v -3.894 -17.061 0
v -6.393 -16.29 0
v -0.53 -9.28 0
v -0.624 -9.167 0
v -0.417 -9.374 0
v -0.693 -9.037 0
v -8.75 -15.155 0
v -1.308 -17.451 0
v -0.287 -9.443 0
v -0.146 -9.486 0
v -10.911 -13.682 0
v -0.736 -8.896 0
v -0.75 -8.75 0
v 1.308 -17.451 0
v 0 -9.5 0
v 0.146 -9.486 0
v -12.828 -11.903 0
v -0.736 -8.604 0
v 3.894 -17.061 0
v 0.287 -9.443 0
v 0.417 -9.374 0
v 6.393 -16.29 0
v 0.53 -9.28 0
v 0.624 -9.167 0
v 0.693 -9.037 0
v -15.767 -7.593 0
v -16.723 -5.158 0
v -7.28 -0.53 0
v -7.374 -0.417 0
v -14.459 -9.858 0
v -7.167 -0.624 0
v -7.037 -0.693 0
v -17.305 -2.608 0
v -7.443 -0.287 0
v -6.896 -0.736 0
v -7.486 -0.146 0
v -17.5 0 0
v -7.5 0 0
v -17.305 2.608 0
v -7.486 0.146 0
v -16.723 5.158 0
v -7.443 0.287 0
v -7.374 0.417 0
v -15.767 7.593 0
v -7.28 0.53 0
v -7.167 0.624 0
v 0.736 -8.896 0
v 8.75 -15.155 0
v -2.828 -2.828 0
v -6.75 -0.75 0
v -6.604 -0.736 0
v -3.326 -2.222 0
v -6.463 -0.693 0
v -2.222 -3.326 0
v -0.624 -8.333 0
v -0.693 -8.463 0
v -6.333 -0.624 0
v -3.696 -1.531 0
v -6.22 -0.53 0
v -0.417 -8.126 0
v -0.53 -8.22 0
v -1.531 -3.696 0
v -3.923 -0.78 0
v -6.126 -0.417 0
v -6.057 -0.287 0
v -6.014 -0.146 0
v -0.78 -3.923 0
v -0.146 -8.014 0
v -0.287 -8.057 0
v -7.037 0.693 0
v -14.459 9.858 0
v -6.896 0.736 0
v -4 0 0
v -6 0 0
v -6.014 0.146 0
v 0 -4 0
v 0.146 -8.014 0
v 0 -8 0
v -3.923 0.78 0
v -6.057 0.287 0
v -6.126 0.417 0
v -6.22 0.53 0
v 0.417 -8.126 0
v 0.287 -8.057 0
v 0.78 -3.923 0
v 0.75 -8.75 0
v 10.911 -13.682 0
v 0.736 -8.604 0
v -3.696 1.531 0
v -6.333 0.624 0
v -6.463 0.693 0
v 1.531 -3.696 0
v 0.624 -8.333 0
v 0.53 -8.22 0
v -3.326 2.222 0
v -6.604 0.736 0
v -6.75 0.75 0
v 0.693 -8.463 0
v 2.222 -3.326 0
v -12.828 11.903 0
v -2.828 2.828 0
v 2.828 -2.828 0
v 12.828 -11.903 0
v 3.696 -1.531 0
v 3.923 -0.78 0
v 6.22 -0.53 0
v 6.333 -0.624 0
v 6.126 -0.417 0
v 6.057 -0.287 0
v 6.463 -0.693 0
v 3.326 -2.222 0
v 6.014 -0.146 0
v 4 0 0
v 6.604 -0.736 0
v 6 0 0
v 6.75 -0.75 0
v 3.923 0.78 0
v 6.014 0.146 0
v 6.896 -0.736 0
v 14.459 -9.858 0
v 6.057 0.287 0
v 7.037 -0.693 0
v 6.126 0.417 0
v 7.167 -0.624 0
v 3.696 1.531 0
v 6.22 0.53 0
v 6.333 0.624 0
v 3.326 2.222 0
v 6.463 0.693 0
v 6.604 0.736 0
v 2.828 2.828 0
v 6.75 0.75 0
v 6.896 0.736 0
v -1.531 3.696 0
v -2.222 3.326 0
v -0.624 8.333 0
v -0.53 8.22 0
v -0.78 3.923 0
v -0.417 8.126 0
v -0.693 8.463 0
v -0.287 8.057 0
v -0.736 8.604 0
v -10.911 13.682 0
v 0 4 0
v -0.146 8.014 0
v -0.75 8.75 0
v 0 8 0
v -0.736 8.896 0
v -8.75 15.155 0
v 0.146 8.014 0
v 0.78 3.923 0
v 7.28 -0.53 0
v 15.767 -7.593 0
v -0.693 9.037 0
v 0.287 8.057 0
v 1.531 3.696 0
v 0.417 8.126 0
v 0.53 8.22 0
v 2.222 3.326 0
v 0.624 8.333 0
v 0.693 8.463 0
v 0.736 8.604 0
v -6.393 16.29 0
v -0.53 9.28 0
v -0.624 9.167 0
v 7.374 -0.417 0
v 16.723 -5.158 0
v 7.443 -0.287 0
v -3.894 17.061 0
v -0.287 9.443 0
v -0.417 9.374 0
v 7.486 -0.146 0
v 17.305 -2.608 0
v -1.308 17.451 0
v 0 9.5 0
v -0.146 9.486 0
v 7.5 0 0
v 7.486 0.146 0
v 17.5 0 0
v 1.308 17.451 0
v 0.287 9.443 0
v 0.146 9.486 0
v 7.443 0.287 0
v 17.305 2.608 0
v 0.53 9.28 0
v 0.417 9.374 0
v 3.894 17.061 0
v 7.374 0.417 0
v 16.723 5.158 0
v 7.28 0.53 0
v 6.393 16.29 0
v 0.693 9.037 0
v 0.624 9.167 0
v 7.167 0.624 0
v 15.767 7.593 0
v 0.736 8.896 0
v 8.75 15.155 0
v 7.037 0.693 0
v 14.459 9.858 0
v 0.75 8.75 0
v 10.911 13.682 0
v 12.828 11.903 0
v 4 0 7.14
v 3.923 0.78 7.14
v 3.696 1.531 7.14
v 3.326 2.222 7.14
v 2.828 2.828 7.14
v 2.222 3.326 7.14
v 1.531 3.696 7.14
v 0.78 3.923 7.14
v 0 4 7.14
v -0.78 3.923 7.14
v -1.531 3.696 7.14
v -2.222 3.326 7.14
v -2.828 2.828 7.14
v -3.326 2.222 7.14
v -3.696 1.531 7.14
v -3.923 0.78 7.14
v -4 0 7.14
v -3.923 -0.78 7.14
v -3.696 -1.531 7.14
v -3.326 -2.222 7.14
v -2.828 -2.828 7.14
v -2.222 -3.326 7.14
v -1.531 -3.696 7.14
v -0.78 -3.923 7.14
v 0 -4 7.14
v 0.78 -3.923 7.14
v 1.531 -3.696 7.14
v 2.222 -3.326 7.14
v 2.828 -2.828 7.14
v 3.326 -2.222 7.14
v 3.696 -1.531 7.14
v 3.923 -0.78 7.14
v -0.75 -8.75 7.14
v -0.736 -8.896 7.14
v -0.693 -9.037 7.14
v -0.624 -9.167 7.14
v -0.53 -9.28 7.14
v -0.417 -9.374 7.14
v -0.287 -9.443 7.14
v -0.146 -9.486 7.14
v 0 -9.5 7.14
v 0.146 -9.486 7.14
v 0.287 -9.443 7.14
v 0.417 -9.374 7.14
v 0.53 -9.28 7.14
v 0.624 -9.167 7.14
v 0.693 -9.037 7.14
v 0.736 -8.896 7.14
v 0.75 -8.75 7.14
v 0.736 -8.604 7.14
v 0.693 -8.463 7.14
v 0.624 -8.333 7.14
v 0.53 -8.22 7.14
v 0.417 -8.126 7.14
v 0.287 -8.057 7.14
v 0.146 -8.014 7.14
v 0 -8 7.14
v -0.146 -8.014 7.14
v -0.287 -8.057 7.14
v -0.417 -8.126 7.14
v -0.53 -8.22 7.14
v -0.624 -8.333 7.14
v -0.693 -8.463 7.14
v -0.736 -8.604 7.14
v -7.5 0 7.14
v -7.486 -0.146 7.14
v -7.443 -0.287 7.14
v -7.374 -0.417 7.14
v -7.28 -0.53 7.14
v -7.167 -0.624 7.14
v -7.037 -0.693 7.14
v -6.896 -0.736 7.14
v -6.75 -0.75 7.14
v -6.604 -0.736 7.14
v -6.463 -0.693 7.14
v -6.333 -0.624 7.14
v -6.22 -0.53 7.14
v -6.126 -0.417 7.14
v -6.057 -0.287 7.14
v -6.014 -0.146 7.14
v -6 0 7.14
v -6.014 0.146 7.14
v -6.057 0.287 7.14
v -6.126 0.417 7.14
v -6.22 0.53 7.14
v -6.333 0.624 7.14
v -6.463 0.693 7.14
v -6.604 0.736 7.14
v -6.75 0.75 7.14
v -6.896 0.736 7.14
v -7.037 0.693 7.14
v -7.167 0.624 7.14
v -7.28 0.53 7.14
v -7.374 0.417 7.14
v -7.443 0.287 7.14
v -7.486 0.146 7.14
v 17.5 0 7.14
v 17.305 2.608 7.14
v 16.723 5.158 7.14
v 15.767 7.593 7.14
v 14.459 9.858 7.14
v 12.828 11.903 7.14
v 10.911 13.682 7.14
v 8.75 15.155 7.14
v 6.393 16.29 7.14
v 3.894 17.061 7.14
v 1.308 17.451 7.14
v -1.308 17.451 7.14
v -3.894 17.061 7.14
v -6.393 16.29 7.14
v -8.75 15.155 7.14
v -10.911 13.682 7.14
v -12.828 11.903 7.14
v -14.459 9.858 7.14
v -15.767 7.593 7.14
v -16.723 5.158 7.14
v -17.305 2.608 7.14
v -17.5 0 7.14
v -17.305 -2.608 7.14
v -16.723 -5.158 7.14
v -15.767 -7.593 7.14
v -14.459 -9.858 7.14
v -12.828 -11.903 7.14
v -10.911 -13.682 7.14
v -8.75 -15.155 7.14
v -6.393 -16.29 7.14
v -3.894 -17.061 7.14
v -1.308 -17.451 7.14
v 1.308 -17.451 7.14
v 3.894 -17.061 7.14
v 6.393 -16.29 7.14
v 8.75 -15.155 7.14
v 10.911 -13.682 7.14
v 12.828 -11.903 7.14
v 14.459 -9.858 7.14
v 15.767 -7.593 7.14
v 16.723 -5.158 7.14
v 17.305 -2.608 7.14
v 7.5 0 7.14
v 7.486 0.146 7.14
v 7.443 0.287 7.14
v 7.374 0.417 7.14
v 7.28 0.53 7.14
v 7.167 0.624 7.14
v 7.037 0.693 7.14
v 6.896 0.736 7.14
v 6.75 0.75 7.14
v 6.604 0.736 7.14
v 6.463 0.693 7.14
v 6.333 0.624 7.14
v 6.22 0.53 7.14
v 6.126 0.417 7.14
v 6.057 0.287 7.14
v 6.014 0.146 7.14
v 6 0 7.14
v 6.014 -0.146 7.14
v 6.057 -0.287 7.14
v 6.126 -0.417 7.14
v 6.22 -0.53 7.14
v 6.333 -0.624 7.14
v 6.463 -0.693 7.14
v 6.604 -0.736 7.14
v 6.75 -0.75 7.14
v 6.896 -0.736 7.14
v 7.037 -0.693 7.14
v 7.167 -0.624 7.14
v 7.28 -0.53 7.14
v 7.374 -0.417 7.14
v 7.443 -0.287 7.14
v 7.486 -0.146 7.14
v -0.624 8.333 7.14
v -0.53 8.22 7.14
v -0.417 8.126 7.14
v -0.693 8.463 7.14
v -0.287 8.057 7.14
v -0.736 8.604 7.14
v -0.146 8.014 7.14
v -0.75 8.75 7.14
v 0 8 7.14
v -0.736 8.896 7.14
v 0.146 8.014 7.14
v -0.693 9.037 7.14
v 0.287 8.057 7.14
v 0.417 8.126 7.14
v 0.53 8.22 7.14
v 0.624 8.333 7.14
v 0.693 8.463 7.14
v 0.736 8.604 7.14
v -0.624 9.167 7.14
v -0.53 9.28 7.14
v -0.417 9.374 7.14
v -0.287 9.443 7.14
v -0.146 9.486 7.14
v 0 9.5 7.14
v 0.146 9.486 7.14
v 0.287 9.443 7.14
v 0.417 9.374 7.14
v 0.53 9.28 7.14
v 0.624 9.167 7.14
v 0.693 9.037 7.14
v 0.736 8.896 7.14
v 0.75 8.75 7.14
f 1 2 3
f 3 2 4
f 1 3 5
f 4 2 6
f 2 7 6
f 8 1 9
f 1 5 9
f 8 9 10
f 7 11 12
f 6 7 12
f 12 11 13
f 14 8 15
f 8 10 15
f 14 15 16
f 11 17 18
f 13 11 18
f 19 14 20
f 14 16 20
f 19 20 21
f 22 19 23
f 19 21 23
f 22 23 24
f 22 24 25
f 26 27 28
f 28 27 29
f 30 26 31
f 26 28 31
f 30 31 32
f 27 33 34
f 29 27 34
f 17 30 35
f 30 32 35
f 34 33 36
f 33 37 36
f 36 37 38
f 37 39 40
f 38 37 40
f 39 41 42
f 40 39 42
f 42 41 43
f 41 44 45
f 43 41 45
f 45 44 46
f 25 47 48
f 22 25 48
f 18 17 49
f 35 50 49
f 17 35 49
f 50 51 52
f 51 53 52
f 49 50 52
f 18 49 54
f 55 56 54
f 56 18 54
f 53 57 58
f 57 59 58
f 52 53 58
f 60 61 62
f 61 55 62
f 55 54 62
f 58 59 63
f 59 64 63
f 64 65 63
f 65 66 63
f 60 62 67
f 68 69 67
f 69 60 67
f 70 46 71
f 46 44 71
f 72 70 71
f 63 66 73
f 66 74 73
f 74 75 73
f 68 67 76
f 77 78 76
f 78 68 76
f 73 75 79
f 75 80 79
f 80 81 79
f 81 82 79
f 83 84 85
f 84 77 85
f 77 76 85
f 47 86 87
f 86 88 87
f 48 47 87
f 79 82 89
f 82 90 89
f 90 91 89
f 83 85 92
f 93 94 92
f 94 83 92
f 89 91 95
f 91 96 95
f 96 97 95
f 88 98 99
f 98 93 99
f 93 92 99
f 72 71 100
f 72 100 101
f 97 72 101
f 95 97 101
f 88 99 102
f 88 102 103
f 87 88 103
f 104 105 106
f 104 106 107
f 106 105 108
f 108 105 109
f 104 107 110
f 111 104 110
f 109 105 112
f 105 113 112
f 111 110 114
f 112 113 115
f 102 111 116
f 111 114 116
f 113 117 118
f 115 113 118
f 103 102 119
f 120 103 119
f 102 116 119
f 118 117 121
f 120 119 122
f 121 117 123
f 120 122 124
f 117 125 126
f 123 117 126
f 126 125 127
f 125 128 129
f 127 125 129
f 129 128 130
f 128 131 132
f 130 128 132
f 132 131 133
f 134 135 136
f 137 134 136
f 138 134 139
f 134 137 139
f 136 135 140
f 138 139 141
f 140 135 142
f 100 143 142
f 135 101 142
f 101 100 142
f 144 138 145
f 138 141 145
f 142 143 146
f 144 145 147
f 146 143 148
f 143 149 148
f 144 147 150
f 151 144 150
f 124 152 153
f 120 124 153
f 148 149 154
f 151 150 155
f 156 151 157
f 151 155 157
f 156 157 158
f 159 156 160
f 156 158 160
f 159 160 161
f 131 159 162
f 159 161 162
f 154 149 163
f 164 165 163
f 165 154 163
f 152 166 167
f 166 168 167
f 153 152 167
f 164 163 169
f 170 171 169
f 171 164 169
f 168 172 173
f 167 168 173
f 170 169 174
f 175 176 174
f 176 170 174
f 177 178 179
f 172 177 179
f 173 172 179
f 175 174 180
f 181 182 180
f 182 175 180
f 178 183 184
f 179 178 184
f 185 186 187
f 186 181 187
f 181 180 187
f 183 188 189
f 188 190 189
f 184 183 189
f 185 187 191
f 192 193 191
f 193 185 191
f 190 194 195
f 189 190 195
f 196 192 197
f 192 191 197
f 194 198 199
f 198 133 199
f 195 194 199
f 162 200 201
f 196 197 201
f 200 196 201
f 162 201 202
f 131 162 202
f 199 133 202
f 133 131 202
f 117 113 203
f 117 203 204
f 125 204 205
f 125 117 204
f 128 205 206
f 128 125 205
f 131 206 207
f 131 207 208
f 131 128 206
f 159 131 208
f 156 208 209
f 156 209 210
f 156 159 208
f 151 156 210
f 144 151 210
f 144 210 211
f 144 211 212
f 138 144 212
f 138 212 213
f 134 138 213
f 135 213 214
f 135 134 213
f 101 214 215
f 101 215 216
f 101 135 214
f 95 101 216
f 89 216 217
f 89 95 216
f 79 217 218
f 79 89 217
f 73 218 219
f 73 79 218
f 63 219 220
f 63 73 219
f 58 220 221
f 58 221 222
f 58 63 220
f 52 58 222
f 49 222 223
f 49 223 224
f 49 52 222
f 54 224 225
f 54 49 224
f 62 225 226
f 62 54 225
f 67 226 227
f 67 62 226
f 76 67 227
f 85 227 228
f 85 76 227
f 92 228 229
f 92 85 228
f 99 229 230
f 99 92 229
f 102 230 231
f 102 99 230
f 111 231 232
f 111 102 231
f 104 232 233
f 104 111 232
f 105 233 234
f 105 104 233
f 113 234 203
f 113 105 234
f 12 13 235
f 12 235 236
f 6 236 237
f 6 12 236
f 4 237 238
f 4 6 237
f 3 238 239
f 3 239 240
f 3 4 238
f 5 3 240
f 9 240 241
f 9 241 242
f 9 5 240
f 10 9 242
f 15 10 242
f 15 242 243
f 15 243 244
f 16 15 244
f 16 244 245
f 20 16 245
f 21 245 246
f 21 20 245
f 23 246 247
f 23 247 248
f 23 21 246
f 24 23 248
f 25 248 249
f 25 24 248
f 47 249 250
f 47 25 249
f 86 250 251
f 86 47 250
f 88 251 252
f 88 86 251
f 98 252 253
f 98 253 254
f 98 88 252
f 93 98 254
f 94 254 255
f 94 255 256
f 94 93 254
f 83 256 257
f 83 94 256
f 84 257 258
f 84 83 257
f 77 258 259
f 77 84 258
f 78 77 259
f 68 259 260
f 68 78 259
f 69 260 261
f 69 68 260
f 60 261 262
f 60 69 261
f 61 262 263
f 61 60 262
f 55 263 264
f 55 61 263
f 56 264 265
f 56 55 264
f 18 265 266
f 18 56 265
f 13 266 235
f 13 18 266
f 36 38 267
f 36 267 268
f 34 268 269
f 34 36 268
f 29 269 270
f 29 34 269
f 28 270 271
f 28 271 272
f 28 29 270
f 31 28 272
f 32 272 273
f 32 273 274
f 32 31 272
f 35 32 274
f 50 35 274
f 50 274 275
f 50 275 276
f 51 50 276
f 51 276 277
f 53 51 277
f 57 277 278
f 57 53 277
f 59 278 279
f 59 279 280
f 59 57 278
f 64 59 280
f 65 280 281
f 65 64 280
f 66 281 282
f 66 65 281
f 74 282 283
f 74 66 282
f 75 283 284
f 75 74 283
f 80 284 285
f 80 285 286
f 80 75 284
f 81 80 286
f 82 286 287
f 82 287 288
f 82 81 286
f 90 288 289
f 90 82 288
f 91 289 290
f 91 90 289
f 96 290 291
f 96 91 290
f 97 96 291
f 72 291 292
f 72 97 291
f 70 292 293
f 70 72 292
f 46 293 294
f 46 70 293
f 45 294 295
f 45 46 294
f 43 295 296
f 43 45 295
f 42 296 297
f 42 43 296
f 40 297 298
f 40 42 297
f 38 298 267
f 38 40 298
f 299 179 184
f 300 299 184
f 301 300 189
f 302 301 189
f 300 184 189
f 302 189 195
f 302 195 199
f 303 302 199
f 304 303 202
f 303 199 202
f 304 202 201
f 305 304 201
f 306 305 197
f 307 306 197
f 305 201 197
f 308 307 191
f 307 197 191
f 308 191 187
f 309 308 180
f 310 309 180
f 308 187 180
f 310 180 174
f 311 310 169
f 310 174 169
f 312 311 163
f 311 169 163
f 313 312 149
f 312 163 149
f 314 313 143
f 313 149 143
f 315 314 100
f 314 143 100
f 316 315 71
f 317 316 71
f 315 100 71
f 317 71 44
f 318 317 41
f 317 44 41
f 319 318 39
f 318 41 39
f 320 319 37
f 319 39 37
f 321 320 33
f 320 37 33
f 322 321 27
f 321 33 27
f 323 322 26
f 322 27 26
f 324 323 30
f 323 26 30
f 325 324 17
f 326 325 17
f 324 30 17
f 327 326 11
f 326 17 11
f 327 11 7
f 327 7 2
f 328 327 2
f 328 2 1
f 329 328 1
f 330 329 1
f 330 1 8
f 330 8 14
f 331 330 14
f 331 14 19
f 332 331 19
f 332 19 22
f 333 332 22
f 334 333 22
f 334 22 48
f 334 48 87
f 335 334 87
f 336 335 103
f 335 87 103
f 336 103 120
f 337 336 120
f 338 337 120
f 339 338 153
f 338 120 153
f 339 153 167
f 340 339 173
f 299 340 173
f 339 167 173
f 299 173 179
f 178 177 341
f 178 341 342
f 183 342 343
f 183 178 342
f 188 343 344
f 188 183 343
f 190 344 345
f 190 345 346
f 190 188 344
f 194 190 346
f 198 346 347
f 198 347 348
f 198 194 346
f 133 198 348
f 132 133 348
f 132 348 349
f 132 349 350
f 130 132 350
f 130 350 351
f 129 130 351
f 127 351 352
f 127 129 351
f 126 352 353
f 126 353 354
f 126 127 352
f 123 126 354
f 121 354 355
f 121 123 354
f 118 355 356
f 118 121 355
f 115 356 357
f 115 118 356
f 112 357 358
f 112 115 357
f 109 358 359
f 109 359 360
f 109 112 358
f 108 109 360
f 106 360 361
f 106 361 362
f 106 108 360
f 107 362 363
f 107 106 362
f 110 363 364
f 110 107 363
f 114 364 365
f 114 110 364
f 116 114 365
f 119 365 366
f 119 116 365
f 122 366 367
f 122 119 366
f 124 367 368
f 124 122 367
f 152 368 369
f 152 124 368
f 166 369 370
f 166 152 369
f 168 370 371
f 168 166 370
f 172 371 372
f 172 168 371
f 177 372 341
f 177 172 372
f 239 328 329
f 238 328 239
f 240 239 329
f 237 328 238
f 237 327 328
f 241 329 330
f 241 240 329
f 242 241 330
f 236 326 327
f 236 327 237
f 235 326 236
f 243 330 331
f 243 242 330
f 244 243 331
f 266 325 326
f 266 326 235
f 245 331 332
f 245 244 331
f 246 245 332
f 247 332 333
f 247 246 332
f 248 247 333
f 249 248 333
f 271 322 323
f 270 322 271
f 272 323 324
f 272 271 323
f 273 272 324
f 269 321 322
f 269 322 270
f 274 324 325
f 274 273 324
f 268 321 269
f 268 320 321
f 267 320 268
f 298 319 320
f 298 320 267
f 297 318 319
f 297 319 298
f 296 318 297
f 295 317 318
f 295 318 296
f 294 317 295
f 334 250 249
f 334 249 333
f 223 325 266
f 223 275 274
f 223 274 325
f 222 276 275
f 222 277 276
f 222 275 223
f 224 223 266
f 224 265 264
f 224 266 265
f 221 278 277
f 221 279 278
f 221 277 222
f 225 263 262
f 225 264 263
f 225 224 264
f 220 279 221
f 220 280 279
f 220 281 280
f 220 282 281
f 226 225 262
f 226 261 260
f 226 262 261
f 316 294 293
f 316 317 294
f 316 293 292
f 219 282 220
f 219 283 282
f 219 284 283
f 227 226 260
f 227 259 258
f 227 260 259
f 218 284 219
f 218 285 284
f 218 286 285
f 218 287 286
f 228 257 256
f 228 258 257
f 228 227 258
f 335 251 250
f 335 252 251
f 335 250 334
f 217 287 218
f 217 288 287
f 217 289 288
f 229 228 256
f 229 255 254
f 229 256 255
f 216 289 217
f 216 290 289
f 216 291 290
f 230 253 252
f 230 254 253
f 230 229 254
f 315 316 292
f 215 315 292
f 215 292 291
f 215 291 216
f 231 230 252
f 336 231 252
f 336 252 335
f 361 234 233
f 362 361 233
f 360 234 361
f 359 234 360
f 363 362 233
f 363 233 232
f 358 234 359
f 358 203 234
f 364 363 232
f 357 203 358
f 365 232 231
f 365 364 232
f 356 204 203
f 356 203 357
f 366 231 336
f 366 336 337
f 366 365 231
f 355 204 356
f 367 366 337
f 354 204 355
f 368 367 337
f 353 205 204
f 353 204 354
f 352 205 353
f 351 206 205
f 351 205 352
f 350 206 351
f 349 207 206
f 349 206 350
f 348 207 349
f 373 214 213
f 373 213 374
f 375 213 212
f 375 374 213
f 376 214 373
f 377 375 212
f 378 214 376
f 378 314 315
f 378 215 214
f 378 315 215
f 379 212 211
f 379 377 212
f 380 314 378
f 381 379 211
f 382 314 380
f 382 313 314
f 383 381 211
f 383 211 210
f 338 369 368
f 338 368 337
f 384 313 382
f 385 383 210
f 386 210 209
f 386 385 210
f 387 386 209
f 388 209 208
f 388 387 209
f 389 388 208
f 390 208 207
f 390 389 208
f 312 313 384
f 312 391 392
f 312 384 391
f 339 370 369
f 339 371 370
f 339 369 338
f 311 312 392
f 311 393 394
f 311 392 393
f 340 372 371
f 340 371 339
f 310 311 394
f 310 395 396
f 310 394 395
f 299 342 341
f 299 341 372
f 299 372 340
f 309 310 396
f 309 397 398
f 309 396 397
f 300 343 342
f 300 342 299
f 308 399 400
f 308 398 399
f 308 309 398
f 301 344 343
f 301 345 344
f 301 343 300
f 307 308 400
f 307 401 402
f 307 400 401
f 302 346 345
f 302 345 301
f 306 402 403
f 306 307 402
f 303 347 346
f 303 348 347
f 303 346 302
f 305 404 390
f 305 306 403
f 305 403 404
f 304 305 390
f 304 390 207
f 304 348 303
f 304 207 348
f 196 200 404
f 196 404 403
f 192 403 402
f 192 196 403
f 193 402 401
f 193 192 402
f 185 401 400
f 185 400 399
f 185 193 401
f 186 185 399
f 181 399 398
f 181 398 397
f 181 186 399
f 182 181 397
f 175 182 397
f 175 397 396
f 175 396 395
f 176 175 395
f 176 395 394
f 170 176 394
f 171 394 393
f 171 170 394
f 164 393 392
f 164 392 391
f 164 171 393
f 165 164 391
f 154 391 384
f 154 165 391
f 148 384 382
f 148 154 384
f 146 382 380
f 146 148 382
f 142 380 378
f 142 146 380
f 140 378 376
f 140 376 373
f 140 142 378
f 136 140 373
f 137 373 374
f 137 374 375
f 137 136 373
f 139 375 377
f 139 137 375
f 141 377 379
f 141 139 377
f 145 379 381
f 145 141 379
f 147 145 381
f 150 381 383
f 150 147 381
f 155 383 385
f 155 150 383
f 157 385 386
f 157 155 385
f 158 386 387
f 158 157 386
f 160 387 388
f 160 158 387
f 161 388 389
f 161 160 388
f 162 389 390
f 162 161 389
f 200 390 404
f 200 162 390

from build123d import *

# Parameters (mm, degrees)
SKETCH_1_R      = 17.5
SKETCH_1_R_2    = 4
SKETCH_1_R_3    = 0.75
EXTRUDE_1_DEPTH = 7.14


with BuildPart() as part:
    # 草图1 → 凸台-拉伸1 (new body)
    with BuildSketch(Plane.XY):
        Circle(SKETCH_1_R)
        Circle(SKETCH_1_R_2, mode=Mode.SUBTRACT)
        with Locations((6.75, 0)):
            Circle(SKETCH_1_R_3, mode=Mode.SUBTRACT)
        with Locations((0, 8.75)):
            Circle(SKETCH_1_R_3, mode=Mode.SUBTRACT)
        with Locations(Location((-6.75, 0, 0), (0, 0, 180))):
            Circle(SKETCH_1_R_3, mode=Mode.SUBTRACT)
        with Locations(Location((0, -8.75, 0), (0, 0, 180))):
            Circle(SKETCH_1_R_3, mode=Mode.SUBTRACT)
    extrude(amount=EXTRUDE_1_DEPTH)


solid = part.part
